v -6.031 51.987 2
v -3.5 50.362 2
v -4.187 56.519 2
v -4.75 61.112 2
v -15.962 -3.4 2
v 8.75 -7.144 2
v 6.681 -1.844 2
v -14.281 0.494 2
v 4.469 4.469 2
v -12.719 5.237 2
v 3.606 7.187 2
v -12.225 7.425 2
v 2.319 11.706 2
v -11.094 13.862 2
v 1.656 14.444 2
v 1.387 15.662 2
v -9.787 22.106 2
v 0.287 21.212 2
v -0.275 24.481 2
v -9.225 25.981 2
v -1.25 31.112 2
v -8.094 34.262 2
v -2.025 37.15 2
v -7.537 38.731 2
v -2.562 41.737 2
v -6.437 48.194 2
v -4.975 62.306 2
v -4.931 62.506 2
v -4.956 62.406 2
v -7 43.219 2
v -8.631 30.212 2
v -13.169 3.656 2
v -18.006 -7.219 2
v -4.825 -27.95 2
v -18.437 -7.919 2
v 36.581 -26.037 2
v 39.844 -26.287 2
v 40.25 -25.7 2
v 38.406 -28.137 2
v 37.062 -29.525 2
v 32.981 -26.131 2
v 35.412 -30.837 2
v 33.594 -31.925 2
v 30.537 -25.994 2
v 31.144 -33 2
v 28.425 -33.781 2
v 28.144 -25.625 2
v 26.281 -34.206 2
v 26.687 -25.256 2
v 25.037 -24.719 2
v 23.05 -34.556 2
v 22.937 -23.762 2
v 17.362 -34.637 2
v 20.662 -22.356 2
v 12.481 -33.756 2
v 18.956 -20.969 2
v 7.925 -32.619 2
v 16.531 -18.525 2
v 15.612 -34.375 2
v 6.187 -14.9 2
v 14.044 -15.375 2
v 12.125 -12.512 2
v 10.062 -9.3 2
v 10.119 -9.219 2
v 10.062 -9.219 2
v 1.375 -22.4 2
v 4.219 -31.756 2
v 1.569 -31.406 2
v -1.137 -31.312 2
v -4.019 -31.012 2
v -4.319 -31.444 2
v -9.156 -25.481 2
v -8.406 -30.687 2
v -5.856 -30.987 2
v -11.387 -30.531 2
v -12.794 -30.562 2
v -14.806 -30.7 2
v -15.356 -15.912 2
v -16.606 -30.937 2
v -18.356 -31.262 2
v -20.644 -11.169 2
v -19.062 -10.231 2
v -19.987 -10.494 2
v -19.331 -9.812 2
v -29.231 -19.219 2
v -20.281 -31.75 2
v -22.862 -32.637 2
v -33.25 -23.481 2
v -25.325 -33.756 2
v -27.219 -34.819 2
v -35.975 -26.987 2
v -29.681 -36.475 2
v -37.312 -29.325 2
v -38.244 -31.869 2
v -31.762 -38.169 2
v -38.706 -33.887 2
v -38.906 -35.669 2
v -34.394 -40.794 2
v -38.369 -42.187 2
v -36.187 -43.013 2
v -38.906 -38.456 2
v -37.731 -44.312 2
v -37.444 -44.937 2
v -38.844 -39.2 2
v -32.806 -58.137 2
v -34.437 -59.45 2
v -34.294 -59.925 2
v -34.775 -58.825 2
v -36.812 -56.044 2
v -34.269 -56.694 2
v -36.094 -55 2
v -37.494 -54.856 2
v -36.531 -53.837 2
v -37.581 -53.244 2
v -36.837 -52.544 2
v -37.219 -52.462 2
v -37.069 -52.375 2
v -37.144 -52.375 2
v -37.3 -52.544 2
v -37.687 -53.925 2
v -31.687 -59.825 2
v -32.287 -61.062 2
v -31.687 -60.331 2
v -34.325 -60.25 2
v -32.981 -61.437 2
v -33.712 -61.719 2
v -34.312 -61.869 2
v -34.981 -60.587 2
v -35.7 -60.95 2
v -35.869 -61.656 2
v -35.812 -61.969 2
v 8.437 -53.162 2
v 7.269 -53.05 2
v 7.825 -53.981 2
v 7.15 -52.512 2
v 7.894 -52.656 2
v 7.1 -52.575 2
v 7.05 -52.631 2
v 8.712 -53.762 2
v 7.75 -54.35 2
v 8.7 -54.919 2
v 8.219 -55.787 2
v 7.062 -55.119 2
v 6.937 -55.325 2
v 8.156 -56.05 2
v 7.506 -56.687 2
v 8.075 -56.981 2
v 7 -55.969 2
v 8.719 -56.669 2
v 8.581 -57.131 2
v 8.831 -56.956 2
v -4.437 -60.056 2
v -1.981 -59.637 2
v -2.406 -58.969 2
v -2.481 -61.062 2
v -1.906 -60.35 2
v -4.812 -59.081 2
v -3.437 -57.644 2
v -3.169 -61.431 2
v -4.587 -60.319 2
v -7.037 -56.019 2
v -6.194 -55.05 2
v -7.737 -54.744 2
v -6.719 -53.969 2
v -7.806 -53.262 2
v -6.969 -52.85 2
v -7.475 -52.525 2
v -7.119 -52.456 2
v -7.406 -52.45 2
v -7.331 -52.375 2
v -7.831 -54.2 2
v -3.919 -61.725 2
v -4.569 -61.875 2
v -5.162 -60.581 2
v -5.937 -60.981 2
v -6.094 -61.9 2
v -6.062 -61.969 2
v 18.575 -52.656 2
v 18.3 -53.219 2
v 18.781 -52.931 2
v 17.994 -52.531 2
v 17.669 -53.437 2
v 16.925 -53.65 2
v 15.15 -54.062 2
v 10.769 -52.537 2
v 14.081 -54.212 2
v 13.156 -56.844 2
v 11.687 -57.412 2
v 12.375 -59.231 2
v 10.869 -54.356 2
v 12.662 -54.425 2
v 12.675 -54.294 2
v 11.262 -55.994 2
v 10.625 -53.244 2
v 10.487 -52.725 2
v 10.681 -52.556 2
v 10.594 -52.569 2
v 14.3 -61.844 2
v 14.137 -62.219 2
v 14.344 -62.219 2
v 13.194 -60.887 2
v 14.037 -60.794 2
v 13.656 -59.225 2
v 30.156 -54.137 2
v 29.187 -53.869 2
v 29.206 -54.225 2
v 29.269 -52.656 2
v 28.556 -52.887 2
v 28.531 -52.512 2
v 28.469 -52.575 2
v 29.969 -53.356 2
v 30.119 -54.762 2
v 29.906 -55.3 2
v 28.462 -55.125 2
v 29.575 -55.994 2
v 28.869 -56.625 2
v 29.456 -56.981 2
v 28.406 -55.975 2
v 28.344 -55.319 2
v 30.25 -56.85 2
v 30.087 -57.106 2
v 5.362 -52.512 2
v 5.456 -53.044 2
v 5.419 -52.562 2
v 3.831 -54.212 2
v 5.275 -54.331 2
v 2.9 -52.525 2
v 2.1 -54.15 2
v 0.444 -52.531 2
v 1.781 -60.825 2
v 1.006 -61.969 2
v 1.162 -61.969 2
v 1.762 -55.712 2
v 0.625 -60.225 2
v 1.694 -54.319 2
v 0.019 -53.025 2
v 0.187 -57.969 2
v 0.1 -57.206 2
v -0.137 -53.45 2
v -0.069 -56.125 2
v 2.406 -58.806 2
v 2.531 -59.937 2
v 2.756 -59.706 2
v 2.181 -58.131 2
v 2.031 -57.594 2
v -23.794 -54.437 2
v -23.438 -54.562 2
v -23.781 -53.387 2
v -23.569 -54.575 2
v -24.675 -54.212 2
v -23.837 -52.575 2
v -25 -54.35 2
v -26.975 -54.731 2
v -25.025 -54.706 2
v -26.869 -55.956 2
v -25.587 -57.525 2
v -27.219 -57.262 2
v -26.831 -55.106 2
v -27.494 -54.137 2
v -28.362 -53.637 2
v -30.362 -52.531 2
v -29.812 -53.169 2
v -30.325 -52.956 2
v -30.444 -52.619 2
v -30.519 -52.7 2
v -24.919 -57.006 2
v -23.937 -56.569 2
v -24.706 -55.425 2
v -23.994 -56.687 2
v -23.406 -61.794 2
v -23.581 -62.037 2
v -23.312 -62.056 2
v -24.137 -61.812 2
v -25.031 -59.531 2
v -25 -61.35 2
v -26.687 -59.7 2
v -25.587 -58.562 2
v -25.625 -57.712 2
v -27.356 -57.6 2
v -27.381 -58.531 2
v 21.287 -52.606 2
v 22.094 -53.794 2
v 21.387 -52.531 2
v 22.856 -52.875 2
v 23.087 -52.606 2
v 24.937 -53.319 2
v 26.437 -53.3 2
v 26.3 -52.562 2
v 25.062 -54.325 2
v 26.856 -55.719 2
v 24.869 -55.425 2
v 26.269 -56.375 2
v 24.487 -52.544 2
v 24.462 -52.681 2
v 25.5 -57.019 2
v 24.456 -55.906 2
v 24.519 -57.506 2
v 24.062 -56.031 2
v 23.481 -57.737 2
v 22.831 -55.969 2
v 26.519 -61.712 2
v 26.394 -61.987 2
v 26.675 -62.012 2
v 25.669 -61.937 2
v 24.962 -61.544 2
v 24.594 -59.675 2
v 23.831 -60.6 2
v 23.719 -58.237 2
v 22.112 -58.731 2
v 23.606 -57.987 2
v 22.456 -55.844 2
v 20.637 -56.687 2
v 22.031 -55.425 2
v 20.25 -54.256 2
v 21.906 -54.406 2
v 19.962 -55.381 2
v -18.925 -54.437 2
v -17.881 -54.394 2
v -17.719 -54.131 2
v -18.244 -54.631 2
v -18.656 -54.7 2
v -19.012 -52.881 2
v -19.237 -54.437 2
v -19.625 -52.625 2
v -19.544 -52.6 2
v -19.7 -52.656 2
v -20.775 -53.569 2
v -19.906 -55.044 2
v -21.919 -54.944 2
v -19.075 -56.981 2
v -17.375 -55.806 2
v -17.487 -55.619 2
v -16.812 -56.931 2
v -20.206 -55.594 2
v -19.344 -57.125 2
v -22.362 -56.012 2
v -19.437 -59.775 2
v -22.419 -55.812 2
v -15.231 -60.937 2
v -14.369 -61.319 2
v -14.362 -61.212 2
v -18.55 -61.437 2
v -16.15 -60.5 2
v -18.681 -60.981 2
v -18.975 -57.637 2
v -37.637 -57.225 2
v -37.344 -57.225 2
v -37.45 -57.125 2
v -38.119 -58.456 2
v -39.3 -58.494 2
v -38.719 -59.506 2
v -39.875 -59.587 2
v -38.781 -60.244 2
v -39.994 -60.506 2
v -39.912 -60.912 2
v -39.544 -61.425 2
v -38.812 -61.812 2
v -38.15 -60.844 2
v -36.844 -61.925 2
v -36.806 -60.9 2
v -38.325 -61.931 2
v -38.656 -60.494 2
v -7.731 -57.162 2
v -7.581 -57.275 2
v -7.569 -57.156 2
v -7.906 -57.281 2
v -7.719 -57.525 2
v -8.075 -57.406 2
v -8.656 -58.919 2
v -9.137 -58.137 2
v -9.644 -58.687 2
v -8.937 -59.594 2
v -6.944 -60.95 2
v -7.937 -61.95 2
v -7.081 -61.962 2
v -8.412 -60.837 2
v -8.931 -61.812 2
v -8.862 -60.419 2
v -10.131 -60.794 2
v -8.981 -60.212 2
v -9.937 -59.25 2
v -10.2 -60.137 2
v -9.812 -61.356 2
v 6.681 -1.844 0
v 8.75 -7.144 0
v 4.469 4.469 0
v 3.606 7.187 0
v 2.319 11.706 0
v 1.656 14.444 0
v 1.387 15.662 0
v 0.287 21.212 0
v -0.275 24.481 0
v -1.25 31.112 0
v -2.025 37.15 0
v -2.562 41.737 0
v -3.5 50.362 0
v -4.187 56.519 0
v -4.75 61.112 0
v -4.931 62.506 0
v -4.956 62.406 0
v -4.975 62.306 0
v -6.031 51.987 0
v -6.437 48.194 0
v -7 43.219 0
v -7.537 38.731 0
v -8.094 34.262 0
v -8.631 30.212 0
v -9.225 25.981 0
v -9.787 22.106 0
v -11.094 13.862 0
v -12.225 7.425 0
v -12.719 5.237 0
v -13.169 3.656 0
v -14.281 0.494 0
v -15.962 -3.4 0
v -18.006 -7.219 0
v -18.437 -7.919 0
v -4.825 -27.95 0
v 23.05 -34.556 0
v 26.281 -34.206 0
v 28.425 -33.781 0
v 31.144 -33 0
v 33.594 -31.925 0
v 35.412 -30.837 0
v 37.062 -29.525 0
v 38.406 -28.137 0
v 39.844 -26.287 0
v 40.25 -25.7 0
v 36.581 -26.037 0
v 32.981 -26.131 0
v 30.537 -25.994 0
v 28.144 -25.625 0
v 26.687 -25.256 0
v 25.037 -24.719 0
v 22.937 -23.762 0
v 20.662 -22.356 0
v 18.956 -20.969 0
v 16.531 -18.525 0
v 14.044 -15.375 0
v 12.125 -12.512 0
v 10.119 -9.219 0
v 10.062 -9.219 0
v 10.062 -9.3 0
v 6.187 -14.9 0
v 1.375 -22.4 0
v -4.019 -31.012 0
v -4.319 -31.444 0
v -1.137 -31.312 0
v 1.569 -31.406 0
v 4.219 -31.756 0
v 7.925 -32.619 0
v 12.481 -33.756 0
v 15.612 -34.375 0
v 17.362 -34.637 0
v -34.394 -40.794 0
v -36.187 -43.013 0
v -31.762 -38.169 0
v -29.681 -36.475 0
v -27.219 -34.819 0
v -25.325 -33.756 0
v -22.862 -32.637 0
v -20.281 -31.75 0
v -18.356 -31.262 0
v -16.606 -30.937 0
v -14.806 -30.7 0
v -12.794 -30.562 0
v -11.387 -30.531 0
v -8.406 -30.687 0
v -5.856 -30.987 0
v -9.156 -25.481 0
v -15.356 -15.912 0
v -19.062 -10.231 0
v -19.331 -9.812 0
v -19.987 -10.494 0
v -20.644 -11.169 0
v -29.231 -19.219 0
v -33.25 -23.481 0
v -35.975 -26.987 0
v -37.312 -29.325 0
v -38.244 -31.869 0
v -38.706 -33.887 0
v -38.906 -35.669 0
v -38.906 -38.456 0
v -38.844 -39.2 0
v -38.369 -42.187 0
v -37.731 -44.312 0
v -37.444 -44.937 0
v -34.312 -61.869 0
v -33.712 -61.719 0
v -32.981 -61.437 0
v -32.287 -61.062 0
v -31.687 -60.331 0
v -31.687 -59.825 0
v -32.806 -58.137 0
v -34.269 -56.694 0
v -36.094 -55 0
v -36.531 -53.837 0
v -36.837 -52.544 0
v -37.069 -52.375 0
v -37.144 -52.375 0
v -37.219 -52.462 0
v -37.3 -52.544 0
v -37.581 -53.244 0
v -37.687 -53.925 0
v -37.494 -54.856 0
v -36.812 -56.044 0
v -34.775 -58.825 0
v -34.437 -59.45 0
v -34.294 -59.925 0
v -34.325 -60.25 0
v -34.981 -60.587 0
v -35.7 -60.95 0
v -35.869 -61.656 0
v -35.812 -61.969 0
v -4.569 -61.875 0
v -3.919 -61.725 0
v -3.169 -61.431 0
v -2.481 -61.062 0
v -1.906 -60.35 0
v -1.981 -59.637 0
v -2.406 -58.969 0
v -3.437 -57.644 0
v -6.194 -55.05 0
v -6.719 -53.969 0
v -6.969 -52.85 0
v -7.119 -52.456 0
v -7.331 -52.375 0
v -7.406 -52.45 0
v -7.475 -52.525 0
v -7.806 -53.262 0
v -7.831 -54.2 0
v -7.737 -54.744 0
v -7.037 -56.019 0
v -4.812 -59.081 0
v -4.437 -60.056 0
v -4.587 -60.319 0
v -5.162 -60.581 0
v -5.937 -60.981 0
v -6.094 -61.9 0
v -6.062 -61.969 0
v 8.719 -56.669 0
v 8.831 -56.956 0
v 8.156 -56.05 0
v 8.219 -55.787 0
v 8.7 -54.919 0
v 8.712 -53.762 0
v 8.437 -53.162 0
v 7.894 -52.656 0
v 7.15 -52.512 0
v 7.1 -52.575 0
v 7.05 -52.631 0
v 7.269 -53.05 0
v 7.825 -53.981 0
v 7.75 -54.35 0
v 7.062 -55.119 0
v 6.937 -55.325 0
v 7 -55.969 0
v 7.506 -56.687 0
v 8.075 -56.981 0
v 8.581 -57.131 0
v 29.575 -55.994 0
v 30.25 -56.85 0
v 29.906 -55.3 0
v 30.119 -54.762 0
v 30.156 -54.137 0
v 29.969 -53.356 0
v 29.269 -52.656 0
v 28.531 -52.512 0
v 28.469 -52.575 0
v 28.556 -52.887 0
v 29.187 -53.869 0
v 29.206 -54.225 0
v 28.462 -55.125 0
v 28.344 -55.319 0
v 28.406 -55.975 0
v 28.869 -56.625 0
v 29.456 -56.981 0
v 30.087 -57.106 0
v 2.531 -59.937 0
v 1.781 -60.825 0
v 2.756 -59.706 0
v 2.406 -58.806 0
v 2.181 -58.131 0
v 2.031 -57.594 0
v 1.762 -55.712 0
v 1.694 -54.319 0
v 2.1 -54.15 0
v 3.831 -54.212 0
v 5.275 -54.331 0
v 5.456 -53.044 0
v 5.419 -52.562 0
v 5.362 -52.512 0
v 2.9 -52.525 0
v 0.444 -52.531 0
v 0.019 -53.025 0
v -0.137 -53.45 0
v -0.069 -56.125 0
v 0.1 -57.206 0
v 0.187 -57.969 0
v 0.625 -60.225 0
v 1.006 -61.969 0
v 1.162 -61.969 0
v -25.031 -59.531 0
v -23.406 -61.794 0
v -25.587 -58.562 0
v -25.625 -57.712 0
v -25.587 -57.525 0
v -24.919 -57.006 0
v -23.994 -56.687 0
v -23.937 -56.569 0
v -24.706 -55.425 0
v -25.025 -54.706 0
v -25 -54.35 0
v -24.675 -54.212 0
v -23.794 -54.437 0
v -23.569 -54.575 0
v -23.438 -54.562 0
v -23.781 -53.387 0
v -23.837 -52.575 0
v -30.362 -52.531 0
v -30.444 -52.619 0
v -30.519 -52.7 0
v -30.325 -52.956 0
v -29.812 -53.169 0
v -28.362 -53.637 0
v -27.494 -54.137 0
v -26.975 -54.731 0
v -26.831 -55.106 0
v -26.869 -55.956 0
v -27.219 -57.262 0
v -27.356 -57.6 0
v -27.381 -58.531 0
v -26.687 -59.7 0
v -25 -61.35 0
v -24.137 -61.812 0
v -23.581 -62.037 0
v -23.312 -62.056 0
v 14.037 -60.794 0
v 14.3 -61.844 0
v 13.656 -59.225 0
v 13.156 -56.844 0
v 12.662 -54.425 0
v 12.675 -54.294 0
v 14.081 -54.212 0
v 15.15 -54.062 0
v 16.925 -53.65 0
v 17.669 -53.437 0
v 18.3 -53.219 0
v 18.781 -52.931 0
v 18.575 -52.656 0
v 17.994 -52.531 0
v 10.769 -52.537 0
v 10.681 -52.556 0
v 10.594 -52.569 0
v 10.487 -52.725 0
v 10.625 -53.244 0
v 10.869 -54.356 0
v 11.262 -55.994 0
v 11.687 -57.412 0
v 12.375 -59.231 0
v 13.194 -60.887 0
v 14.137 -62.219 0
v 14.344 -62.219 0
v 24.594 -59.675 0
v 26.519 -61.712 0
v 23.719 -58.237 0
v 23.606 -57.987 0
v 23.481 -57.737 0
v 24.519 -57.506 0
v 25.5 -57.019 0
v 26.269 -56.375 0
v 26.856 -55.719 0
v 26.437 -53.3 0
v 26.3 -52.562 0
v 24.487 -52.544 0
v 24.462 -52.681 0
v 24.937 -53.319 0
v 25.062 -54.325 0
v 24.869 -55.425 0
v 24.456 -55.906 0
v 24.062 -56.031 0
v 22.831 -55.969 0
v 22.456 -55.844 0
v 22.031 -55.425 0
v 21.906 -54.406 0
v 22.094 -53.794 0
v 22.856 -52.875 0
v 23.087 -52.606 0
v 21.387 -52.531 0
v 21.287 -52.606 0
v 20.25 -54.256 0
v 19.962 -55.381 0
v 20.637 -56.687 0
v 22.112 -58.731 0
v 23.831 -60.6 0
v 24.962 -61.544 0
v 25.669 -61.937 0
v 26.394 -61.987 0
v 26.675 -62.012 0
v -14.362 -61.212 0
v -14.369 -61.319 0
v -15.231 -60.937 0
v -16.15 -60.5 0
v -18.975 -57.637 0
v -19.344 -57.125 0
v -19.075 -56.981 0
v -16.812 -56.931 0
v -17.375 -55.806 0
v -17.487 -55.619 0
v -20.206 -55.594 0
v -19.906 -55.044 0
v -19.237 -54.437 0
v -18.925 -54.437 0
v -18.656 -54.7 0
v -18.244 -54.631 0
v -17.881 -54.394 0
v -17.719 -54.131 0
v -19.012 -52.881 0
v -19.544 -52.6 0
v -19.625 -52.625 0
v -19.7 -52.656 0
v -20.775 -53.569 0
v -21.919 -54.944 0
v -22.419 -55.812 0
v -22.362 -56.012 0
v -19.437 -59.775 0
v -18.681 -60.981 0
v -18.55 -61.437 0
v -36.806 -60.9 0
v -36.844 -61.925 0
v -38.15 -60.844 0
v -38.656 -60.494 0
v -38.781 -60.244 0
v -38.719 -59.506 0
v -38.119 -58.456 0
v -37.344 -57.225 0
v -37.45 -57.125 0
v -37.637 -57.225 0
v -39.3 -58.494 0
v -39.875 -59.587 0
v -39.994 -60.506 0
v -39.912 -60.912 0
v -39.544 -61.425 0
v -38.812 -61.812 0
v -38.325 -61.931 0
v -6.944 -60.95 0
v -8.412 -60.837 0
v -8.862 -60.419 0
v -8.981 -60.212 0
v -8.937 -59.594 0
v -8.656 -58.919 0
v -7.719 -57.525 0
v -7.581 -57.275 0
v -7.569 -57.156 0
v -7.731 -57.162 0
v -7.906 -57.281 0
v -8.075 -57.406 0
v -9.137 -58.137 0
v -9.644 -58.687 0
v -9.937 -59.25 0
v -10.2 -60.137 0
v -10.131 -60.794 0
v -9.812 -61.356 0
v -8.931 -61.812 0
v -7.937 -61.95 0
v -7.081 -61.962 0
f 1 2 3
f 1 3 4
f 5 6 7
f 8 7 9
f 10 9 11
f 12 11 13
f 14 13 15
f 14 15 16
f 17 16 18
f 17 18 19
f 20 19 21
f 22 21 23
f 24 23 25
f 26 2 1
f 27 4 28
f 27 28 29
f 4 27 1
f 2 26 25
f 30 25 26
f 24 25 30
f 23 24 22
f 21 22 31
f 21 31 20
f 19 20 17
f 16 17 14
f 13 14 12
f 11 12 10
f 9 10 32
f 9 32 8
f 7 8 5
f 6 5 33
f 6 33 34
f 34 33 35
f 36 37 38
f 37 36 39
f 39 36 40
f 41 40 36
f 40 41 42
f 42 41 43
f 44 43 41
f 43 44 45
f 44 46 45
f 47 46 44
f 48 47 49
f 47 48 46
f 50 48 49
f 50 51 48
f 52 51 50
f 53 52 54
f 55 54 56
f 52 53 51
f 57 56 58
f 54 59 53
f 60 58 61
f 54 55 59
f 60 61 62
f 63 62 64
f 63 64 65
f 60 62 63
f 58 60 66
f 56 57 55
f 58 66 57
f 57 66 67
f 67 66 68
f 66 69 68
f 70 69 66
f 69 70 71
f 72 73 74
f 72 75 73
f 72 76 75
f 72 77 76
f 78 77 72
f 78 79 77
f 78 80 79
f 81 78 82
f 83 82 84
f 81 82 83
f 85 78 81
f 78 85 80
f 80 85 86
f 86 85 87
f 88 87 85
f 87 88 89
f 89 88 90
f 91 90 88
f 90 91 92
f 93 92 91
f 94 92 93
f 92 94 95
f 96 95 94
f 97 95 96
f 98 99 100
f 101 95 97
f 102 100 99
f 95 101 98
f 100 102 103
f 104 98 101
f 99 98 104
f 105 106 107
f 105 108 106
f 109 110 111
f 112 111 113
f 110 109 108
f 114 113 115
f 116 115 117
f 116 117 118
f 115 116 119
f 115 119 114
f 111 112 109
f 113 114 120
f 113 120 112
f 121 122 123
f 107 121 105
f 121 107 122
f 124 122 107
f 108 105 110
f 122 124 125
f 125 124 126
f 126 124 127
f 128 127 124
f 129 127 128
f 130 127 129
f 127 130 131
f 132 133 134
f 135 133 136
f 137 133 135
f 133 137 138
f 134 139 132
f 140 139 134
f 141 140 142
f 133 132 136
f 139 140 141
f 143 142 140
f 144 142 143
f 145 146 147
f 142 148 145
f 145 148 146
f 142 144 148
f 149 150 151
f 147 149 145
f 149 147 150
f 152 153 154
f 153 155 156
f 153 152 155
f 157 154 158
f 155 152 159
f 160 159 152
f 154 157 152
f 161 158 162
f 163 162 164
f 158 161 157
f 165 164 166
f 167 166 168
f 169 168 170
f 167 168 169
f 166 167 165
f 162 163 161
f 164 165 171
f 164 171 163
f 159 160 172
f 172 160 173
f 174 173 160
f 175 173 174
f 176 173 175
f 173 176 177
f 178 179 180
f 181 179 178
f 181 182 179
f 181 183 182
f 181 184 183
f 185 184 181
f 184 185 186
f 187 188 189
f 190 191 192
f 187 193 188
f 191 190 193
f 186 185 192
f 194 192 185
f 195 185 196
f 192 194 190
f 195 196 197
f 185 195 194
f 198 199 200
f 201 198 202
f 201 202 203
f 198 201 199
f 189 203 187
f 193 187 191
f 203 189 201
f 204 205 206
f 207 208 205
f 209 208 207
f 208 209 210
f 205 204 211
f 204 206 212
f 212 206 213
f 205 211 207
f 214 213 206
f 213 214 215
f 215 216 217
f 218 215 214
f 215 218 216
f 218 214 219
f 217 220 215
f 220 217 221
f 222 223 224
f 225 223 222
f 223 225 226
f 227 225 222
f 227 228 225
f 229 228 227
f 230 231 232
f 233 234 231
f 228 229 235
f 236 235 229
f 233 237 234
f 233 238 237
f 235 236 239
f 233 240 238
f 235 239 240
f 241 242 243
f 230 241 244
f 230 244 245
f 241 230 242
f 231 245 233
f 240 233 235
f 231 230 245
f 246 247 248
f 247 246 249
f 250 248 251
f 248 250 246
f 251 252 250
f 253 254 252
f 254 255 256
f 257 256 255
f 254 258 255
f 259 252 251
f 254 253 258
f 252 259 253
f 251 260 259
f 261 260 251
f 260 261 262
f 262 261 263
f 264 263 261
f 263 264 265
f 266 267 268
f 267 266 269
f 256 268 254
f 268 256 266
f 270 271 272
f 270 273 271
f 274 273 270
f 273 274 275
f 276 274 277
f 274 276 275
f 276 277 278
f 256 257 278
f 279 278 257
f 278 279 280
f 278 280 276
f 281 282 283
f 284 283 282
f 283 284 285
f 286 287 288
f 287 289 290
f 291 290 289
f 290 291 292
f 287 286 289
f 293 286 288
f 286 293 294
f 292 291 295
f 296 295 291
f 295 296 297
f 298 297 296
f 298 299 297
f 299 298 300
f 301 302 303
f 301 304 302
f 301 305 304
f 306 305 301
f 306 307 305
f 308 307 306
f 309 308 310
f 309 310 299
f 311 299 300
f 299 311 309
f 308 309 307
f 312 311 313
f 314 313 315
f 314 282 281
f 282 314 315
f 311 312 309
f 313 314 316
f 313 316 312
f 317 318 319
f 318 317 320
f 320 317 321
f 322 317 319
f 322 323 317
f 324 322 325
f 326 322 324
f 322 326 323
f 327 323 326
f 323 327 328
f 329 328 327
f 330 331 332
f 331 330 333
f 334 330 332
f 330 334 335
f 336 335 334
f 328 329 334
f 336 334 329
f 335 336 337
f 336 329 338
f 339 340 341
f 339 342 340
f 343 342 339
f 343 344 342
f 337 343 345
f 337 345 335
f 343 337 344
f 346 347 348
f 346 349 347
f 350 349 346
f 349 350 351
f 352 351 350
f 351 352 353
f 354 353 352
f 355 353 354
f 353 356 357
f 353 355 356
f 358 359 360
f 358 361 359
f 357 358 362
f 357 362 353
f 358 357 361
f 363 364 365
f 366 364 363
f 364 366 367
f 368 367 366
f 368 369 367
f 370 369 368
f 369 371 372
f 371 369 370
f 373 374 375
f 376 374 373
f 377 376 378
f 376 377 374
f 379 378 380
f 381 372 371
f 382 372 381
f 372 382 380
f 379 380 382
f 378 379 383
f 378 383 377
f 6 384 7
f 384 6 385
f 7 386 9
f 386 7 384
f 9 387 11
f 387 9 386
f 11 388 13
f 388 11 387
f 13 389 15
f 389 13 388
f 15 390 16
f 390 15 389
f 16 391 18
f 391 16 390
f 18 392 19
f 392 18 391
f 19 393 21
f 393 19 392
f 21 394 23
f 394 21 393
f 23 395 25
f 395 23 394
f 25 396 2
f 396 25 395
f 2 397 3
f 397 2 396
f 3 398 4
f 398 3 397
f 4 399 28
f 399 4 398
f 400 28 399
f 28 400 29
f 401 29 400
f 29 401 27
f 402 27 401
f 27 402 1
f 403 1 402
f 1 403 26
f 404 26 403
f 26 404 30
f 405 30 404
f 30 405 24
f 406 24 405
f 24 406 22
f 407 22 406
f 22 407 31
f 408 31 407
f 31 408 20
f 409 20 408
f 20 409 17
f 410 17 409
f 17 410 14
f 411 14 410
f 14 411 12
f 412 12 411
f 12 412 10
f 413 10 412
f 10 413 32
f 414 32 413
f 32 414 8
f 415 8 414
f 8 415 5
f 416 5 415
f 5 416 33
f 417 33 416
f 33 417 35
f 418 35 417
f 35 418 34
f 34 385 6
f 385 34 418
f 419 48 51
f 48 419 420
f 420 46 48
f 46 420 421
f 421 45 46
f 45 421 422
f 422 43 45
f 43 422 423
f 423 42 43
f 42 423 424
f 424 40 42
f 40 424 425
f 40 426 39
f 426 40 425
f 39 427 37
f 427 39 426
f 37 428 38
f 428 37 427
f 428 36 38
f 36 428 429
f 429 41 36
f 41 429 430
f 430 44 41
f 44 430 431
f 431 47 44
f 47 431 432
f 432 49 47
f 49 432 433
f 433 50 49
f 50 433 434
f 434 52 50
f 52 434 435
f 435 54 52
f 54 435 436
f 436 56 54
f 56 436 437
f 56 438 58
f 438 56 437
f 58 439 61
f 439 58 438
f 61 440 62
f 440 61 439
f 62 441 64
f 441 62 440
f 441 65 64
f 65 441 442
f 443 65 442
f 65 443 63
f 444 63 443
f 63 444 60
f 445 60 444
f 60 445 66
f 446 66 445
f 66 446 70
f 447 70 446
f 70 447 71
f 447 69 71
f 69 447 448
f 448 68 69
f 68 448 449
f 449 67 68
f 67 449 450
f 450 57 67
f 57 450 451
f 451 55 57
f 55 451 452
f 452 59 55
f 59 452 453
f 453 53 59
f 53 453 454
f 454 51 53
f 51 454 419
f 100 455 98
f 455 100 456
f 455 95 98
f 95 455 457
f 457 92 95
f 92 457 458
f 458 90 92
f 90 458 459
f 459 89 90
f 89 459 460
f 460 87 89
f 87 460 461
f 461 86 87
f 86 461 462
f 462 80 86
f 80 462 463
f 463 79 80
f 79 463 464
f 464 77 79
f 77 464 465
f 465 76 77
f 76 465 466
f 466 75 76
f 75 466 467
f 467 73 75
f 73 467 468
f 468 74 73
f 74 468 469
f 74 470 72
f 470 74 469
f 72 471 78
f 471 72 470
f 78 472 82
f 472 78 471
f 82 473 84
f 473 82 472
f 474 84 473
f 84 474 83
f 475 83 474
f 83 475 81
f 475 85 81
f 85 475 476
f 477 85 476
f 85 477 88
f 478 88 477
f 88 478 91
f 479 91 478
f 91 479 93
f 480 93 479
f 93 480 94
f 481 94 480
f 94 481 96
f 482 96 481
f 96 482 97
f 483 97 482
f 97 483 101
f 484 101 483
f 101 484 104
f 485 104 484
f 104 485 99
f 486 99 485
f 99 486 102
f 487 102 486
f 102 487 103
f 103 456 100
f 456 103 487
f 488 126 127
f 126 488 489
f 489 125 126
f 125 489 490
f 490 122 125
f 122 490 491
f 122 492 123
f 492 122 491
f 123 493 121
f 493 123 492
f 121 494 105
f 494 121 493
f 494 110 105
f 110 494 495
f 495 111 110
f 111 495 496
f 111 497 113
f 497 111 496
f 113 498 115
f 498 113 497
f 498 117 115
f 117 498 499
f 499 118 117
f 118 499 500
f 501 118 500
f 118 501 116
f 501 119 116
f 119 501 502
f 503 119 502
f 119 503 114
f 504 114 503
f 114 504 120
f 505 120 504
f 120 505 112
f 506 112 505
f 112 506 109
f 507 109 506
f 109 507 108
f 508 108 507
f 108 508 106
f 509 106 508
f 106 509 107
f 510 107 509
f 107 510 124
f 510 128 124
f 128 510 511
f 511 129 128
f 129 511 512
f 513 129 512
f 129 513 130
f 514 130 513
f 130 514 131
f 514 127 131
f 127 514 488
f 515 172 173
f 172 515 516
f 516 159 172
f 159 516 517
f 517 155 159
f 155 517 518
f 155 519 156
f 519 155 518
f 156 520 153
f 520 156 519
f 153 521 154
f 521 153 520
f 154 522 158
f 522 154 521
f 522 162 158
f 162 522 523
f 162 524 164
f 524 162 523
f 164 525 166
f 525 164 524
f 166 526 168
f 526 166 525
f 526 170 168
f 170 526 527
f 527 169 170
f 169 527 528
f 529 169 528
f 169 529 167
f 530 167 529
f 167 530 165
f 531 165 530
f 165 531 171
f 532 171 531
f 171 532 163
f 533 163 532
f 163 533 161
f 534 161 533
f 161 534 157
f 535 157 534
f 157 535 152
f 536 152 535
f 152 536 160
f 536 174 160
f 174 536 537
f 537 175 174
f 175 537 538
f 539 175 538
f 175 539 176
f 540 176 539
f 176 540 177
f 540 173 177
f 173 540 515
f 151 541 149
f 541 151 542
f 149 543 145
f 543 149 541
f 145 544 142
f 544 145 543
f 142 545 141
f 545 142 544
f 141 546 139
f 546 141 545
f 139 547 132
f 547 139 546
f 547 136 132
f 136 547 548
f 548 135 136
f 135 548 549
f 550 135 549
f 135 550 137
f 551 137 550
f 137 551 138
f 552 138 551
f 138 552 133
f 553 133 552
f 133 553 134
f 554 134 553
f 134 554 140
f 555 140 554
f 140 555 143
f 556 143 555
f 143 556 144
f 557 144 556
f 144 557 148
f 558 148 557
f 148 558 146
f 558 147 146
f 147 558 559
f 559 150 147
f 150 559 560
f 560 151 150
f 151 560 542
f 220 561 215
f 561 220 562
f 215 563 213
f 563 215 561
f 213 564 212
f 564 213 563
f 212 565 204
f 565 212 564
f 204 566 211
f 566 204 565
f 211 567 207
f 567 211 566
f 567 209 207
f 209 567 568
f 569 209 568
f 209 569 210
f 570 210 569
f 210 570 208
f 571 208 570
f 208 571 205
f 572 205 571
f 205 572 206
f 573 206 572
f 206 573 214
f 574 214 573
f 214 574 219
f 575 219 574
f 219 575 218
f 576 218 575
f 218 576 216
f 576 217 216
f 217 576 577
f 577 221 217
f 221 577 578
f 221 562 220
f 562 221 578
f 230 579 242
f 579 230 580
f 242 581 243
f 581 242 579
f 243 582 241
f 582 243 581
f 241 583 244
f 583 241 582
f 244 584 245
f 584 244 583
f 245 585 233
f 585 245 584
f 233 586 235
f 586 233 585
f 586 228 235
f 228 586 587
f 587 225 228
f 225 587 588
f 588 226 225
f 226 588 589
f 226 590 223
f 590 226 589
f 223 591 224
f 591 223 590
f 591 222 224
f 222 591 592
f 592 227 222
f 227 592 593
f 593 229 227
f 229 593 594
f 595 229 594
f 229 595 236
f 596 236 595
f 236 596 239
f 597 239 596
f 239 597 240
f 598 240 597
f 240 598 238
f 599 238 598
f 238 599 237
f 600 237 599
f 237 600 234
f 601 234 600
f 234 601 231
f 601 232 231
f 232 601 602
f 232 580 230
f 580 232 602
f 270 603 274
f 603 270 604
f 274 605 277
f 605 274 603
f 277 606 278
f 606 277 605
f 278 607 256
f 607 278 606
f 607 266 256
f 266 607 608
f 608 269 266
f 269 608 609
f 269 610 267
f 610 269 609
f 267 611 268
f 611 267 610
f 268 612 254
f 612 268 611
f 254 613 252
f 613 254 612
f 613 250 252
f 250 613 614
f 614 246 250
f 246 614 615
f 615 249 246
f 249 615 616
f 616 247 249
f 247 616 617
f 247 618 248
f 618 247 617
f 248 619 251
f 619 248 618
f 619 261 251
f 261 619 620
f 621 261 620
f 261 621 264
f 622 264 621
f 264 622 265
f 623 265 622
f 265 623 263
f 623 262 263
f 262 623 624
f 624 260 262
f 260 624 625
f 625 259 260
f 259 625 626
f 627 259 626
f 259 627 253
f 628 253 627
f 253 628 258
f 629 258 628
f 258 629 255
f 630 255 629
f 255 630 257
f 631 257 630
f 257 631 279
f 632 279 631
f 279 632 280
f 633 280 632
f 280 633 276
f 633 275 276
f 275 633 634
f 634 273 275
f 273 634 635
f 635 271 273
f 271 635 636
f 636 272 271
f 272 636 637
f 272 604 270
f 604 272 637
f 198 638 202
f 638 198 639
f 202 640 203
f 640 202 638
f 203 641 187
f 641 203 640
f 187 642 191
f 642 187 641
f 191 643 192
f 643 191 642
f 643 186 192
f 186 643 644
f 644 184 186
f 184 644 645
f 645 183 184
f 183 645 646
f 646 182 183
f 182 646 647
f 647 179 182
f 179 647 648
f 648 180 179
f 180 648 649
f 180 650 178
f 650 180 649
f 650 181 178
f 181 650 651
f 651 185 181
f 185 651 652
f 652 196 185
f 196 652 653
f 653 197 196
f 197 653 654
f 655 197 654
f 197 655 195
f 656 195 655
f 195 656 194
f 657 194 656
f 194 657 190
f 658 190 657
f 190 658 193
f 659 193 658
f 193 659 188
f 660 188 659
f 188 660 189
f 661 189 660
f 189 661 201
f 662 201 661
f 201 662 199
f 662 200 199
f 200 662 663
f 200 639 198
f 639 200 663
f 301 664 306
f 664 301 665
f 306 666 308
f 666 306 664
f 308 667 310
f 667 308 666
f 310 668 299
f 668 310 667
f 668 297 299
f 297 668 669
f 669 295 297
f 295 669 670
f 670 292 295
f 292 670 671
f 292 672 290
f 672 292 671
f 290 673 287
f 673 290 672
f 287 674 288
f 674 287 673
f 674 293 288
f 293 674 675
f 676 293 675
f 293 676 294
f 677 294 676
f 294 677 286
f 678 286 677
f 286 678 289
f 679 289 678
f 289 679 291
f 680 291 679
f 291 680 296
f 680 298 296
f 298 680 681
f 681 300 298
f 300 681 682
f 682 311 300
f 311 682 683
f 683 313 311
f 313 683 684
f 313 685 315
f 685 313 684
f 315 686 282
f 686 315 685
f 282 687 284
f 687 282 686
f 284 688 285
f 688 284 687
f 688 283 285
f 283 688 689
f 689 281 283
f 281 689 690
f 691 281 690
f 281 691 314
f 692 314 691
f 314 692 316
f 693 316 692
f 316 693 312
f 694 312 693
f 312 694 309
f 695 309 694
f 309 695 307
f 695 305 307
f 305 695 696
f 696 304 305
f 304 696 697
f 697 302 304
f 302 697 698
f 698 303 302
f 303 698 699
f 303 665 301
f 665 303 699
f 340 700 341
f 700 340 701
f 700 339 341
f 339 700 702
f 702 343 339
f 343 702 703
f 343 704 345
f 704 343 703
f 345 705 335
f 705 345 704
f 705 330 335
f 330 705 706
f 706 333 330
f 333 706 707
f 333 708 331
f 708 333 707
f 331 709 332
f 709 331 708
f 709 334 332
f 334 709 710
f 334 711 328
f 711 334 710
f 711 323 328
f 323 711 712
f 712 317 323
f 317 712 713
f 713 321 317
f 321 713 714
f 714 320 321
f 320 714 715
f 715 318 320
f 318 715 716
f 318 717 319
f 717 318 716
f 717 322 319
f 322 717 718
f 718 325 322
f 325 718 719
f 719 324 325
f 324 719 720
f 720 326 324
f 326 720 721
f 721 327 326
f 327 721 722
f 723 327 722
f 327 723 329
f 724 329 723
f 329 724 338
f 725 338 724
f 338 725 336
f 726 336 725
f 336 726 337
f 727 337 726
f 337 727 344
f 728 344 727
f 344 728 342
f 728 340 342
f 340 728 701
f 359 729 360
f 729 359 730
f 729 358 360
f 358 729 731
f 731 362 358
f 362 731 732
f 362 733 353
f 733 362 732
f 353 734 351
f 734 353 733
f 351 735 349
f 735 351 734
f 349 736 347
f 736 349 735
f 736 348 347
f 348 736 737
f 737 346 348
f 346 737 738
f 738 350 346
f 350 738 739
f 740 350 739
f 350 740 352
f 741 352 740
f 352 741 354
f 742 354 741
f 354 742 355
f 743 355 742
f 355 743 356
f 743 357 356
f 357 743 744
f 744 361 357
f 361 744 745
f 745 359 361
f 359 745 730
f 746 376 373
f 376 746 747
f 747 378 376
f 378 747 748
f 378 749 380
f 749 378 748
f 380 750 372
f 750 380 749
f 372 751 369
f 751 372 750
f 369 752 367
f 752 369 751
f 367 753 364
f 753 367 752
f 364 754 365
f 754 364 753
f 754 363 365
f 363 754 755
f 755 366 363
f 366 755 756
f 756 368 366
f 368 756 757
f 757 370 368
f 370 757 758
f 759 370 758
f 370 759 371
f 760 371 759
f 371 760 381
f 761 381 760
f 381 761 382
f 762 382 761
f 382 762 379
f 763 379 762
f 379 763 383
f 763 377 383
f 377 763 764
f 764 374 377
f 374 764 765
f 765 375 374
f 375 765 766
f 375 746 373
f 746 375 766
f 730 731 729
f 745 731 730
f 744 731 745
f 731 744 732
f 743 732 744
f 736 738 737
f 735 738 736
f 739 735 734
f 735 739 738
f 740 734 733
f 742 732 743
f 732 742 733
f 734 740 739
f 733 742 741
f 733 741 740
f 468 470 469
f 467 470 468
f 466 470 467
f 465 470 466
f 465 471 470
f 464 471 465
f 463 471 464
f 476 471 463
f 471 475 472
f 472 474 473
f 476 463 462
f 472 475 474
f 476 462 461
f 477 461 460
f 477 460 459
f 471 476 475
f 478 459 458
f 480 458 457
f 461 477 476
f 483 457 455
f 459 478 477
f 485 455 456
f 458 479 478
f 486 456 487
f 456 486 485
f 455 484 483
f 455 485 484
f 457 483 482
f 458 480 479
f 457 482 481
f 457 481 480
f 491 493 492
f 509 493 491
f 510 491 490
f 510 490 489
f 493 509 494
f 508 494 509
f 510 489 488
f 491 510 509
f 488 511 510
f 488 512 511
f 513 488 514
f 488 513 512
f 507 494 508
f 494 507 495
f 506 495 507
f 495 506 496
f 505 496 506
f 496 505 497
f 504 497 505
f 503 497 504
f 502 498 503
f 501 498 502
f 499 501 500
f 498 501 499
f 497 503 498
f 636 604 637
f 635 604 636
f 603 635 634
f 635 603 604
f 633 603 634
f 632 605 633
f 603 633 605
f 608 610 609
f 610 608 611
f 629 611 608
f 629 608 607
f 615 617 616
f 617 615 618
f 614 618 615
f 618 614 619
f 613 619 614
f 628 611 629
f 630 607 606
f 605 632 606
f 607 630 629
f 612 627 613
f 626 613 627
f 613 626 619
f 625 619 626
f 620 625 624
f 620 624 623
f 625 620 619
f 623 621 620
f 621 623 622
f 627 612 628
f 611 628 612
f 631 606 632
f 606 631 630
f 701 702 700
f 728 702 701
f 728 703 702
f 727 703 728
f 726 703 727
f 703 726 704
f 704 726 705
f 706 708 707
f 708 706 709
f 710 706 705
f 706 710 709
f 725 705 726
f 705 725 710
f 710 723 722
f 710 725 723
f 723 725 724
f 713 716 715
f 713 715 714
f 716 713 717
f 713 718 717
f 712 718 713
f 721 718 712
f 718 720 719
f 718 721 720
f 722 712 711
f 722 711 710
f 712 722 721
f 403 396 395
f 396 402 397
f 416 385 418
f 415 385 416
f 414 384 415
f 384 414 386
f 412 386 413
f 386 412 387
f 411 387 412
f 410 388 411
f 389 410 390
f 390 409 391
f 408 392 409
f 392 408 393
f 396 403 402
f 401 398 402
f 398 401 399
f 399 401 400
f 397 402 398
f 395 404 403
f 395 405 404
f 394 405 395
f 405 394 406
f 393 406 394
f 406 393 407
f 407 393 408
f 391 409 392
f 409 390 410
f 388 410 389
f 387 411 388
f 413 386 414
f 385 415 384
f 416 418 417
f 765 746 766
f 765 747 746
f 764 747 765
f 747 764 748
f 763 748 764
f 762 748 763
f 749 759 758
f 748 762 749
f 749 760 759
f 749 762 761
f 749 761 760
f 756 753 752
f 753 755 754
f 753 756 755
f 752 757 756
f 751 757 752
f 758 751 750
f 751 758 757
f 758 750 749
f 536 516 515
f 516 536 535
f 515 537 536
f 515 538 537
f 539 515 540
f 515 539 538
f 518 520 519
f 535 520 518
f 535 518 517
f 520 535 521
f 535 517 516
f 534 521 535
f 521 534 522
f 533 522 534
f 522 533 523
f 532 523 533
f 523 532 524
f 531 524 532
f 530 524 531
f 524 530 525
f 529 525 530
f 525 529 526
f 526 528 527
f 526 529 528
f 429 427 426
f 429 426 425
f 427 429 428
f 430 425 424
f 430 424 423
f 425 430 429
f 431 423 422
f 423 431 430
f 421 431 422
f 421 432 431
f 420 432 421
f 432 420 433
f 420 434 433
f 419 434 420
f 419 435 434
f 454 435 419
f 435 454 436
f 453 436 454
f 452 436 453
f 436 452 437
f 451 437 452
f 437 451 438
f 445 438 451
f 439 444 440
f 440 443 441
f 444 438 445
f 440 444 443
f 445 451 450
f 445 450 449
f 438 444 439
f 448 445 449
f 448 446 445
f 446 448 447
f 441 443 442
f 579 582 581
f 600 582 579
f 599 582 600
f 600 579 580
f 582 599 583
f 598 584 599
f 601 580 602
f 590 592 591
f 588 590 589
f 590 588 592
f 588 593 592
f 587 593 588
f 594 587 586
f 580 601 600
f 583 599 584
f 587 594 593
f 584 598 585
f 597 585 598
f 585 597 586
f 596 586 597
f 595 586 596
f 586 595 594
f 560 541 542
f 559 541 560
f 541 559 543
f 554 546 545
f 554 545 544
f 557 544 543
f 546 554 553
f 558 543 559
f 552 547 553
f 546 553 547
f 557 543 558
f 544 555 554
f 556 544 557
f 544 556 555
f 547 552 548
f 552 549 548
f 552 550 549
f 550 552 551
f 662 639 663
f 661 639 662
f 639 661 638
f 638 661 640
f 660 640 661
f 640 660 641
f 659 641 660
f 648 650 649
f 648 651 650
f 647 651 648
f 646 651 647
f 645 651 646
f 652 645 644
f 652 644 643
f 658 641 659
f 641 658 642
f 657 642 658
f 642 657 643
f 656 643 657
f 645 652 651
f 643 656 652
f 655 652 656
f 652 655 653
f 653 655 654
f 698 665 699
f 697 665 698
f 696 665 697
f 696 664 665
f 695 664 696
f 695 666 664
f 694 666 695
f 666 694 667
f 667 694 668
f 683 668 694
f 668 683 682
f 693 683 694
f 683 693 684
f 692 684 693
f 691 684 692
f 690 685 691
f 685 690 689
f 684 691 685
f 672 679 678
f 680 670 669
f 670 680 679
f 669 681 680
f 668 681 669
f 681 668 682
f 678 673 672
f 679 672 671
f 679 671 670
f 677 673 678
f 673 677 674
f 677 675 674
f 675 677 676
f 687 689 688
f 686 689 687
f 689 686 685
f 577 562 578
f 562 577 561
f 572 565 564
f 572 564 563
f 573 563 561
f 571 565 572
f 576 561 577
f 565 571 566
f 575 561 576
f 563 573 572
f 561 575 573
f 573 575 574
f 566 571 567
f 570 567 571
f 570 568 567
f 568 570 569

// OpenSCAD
module 7b9c77ea63c6c9b8106db96a84fa58ad_1()
{
 /* Generated by trace2scad version 20150415
    http://aggregate.org/MAKE/TRACE2SCAD/
    Optimized model has 387/4796 original points
 */
 color([0.48, 0.48, 0.48])
 assign(minx=0) /* polygon minx=39 */
 assign(miny=0) /* polygon miny=45 */
 assign(maxx=12880) /* polygon maxx=12880 */
 assign(maxy=20000) /* polygon maxy=20001 */
 assign(dx=maxx-minx)
 assign(dy=maxy-miny)
 assign(maxd=((dx>dy)?dx:dy))
 scale([1/maxd, 1/maxd, 1])
 translate([-minx-dx/2, -miny-dy/2, 0])
 linear_extrude(height=1, convexity=387)
 union() {
  union() {
   polygon([[5647,19985],[5644,19969],[5475,18318],[5410,17711],[5320,16915],[5234,16197],[5145,15482],[5059,14834],[4964,14157],[4874,13537],[4665,12218],[4484,11188],[4405,10838],[4333,10585],[4155,10079],[3886,9456],[3559,8845],[3490,8733],[5668,5528],[7840,8857],[7509,9705],[7155,10715],[7017,11150],[6811,11873],[6705,12311],[6662,12506],[6486,13394],[6396,13917],[6240,14978],[6116,15944],[6030,16678],[5880,18058],[5770,19043],[5680,19778],[5651,20001]], convexity=6);
   polygon([[8050,8518],[8050,8512],[7430,7616],[6660,6416],[5797,5038],[5749,4969],[6258,4990],[6691,4975],[7115,4919],[7708,4781],[8437,4599],[8938,4500],[9218,4458],[10128,4471],[10645,4527],[10988,4595],[11423,4720],[11815,4892],[12106,5066],[12370,5276],[12585,5498],[12815,5794],[12880,5888],[12293,5834],[11717,5819],[11326,5841],[10943,5900],[10710,5959],[10446,6045],[10110,6198],[9746,6423],[9473,6645],[9085,7036],[8687,7540],[8380,7998],[8059,8525],[8050,8525]], convexity=9);
   polygon([[3242,8321],[3137,8213],[1763,6925],[1120,6243],[684,5682],[470,5308],[321,4901],[247,4578],[215,4293],[215,3847],[225,3728],[301,3250],[403,2910],[449,2810],[650,3118],[937,3473],[1358,3893],[1691,4164],[2085,4429],[2388,4599],[2782,4778],[3195,4920],[3503,4998],[3783,5050],[4071,5088],[4393,5110],[4618,5115],[5095,5090],[5503,5042],[4975,5923],[3983,7454],[3390,8363],[3347,8430]], convexity=7);
   polygon([[485,1606],[472,1593],[427,1481],[410,1372],[441,1223],[550,1033],[876,588],[930,488],[953,412],[948,360],[843,306],[728,248],[701,135],[710,85],[950,101],[1046,125],[1163,170],[1274,230],[1370,347],[1370,428],[1191,698],[957,929],[665,1200],[595,1386],[546,1593],[509,1620],[497,1620]], convexity=8);
   polygon([[5255,1608],[5244,1596],[5191,1478],[5187,1328],[5202,1241],[5314,1037],[5670,547],[5730,391],[5706,349],[5614,307],[5490,243],[5465,96],[5470,85],[5709,100],[5813,124],[5933,171],[6043,230],[6135,344],[6123,458],[6055,565],[5890,777],[5449,1192],[5365,1365],[5325,1544],[5301,1607],[5267,1620]], convexity=8);
   polygon([[6904,1596],[6511,1595],[6443,1516],[6418,1448],[6429,1020],[6456,847],[6470,725],[6540,364],[6601,85],[6626,85],[6725,268],[6845,410],[6881,447],[6825,591],[6789,699],[6765,785],[6722,1086],[6711,1309],[6776,1336],[7053,1326],[7284,1307],[7313,1513],[7307,1590],[7298,1598]], convexity=10);
   polygon([[7576,1588],[7568,1579],[7603,1512],[7692,1363],[7680,1304],[7570,1181],[7550,1148],[7560,1045],[7641,930],[7732,883],[7813,859],[7853,887],[7835,933],[7745,1032],[7755,1074],[7832,1213],[7834,1398],[7790,1494],[7703,1575],[7584,1598]], convexity=10);
   polygon([[11000,1593],[10995,1588],[11009,1538],[11110,1381],[11113,1324],[10994,1180],[10975,1149],[10985,1044],[11059,940],[11153,883],[11254,863],[11280,904],[11172,1041],[11225,1152],[11259,1238],[11265,1338],[11235,1463],[11123,1575],[11005,1598]], convexity=10);
   polygon([[1569,1581],[1557,1568],[1588,1527],[1670,1493],[1902,1418],[2041,1338],[2124,1243],[2147,1183],[2141,1047],[2085,838],[2063,784],[2059,635],[2170,448],[2440,184],[2578,110],[2667,74],[2710,71],[2695,113],[2435,475],[2346,630],[2340,766],[2346,796],[2453,879],[2601,930],[2610,949],[2487,1132],[2436,1247],[2440,1304],[2492,1326],[2633,1290],[2669,1268],[2690,1270],[2635,1458],[2626,1588],[1582,1595]], convexity=13);
   polygon([[8149,1591],[8135,1589],[8118,1564],[8140,1481],[8179,1303],[8242,1041],[8310,814],[8420,523],[8551,258],[8702,45],[8735,45],[8728,105],[8686,273],[8625,524],[8545,905],[8466,1292],[8468,1313],[8693,1326],[8864,1350],[9148,1416],[9267,1450],[9368,1485],[9445,1531],[9412,1575],[9319,1595],[8163,1594]], convexity=9);
   polygon([[9854,1589],[9846,1583],[9680,1319],[9634,1139],[9742,930],[9978,603],[10253,304],[10434,153],[10547,90],[10663,82],[10708,78],[10683,126],[10375,452],[10235,682],[10217,722],[10197,762],[10363,799],[10520,877],[10643,980],[10737,1085],[10670,1472],[10648,1590],[10358,1593],[10354,1571],[10430,1469],[10450,1308],[10419,1132],[10353,1055],[10290,1035],[10093,1045],[10033,1065],[9965,1132],[9945,1295],[9975,1393],[10097,1540],[10134,1583],[9862,1595]], convexity=13);
   polygon([[3300,1580],[3288,1575],[3116,1429],[2933,1209],[2853,1070],[2862,1038],[3330,436],[3451,243],[3472,170],[4141,189],[4142,206],[4003,250],[3856,320],[3404,778],[3345,860],[3388,883],[3750,891],[3660,1071],[3642,1101],[3207,1105],[3255,1193],[3362,1290],[3412,1290],[3455,1248],[3521,1259],[3579,1297],[3605,1339],[3398,1539],[3313,1584]], convexity=12);
   polygon([[433,852],[418,844],[152,641],[60,466],[41,319],[54,254],[113,172],[230,110],[308,91],[545,92],[551,256],[336,265],[255,321],[235,361],[245,479],[341,647],[465,844],[448,860]], convexity=8);
   polygon([[5175,835],[5148,815],[4978,698],[4897,610],[4850,520],[4808,378],[4819,273],[4870,183],[5011,110],[5170,88],[5307,86],[5329,248],[5094,266],[5022,333],[5003,366],[5010,465],[5055,573],[5205,796],[5227,836],[5229,855],[5203,854]], convexity=8);
  }
 }
}

module 7b9c77ea63c6c9b8106db96a84fa58ad()
{
 /* all layers combined, scaled to within a 1mm cube */
 scale([1, 1, 1/1])
 difference() {
  union() {
   scale([1,1,2]) translate([0,0,-0.5]) 7b9c77ea63c6c9b8106db96a84fa58ad_1();
  }
  translate([0,0,-2]) cube([2,2,4],center=true);
 }
}

scale([125, 125, 2]) {
	7b9c77ea63c6c9b8106db96a84fa58ad();
}
